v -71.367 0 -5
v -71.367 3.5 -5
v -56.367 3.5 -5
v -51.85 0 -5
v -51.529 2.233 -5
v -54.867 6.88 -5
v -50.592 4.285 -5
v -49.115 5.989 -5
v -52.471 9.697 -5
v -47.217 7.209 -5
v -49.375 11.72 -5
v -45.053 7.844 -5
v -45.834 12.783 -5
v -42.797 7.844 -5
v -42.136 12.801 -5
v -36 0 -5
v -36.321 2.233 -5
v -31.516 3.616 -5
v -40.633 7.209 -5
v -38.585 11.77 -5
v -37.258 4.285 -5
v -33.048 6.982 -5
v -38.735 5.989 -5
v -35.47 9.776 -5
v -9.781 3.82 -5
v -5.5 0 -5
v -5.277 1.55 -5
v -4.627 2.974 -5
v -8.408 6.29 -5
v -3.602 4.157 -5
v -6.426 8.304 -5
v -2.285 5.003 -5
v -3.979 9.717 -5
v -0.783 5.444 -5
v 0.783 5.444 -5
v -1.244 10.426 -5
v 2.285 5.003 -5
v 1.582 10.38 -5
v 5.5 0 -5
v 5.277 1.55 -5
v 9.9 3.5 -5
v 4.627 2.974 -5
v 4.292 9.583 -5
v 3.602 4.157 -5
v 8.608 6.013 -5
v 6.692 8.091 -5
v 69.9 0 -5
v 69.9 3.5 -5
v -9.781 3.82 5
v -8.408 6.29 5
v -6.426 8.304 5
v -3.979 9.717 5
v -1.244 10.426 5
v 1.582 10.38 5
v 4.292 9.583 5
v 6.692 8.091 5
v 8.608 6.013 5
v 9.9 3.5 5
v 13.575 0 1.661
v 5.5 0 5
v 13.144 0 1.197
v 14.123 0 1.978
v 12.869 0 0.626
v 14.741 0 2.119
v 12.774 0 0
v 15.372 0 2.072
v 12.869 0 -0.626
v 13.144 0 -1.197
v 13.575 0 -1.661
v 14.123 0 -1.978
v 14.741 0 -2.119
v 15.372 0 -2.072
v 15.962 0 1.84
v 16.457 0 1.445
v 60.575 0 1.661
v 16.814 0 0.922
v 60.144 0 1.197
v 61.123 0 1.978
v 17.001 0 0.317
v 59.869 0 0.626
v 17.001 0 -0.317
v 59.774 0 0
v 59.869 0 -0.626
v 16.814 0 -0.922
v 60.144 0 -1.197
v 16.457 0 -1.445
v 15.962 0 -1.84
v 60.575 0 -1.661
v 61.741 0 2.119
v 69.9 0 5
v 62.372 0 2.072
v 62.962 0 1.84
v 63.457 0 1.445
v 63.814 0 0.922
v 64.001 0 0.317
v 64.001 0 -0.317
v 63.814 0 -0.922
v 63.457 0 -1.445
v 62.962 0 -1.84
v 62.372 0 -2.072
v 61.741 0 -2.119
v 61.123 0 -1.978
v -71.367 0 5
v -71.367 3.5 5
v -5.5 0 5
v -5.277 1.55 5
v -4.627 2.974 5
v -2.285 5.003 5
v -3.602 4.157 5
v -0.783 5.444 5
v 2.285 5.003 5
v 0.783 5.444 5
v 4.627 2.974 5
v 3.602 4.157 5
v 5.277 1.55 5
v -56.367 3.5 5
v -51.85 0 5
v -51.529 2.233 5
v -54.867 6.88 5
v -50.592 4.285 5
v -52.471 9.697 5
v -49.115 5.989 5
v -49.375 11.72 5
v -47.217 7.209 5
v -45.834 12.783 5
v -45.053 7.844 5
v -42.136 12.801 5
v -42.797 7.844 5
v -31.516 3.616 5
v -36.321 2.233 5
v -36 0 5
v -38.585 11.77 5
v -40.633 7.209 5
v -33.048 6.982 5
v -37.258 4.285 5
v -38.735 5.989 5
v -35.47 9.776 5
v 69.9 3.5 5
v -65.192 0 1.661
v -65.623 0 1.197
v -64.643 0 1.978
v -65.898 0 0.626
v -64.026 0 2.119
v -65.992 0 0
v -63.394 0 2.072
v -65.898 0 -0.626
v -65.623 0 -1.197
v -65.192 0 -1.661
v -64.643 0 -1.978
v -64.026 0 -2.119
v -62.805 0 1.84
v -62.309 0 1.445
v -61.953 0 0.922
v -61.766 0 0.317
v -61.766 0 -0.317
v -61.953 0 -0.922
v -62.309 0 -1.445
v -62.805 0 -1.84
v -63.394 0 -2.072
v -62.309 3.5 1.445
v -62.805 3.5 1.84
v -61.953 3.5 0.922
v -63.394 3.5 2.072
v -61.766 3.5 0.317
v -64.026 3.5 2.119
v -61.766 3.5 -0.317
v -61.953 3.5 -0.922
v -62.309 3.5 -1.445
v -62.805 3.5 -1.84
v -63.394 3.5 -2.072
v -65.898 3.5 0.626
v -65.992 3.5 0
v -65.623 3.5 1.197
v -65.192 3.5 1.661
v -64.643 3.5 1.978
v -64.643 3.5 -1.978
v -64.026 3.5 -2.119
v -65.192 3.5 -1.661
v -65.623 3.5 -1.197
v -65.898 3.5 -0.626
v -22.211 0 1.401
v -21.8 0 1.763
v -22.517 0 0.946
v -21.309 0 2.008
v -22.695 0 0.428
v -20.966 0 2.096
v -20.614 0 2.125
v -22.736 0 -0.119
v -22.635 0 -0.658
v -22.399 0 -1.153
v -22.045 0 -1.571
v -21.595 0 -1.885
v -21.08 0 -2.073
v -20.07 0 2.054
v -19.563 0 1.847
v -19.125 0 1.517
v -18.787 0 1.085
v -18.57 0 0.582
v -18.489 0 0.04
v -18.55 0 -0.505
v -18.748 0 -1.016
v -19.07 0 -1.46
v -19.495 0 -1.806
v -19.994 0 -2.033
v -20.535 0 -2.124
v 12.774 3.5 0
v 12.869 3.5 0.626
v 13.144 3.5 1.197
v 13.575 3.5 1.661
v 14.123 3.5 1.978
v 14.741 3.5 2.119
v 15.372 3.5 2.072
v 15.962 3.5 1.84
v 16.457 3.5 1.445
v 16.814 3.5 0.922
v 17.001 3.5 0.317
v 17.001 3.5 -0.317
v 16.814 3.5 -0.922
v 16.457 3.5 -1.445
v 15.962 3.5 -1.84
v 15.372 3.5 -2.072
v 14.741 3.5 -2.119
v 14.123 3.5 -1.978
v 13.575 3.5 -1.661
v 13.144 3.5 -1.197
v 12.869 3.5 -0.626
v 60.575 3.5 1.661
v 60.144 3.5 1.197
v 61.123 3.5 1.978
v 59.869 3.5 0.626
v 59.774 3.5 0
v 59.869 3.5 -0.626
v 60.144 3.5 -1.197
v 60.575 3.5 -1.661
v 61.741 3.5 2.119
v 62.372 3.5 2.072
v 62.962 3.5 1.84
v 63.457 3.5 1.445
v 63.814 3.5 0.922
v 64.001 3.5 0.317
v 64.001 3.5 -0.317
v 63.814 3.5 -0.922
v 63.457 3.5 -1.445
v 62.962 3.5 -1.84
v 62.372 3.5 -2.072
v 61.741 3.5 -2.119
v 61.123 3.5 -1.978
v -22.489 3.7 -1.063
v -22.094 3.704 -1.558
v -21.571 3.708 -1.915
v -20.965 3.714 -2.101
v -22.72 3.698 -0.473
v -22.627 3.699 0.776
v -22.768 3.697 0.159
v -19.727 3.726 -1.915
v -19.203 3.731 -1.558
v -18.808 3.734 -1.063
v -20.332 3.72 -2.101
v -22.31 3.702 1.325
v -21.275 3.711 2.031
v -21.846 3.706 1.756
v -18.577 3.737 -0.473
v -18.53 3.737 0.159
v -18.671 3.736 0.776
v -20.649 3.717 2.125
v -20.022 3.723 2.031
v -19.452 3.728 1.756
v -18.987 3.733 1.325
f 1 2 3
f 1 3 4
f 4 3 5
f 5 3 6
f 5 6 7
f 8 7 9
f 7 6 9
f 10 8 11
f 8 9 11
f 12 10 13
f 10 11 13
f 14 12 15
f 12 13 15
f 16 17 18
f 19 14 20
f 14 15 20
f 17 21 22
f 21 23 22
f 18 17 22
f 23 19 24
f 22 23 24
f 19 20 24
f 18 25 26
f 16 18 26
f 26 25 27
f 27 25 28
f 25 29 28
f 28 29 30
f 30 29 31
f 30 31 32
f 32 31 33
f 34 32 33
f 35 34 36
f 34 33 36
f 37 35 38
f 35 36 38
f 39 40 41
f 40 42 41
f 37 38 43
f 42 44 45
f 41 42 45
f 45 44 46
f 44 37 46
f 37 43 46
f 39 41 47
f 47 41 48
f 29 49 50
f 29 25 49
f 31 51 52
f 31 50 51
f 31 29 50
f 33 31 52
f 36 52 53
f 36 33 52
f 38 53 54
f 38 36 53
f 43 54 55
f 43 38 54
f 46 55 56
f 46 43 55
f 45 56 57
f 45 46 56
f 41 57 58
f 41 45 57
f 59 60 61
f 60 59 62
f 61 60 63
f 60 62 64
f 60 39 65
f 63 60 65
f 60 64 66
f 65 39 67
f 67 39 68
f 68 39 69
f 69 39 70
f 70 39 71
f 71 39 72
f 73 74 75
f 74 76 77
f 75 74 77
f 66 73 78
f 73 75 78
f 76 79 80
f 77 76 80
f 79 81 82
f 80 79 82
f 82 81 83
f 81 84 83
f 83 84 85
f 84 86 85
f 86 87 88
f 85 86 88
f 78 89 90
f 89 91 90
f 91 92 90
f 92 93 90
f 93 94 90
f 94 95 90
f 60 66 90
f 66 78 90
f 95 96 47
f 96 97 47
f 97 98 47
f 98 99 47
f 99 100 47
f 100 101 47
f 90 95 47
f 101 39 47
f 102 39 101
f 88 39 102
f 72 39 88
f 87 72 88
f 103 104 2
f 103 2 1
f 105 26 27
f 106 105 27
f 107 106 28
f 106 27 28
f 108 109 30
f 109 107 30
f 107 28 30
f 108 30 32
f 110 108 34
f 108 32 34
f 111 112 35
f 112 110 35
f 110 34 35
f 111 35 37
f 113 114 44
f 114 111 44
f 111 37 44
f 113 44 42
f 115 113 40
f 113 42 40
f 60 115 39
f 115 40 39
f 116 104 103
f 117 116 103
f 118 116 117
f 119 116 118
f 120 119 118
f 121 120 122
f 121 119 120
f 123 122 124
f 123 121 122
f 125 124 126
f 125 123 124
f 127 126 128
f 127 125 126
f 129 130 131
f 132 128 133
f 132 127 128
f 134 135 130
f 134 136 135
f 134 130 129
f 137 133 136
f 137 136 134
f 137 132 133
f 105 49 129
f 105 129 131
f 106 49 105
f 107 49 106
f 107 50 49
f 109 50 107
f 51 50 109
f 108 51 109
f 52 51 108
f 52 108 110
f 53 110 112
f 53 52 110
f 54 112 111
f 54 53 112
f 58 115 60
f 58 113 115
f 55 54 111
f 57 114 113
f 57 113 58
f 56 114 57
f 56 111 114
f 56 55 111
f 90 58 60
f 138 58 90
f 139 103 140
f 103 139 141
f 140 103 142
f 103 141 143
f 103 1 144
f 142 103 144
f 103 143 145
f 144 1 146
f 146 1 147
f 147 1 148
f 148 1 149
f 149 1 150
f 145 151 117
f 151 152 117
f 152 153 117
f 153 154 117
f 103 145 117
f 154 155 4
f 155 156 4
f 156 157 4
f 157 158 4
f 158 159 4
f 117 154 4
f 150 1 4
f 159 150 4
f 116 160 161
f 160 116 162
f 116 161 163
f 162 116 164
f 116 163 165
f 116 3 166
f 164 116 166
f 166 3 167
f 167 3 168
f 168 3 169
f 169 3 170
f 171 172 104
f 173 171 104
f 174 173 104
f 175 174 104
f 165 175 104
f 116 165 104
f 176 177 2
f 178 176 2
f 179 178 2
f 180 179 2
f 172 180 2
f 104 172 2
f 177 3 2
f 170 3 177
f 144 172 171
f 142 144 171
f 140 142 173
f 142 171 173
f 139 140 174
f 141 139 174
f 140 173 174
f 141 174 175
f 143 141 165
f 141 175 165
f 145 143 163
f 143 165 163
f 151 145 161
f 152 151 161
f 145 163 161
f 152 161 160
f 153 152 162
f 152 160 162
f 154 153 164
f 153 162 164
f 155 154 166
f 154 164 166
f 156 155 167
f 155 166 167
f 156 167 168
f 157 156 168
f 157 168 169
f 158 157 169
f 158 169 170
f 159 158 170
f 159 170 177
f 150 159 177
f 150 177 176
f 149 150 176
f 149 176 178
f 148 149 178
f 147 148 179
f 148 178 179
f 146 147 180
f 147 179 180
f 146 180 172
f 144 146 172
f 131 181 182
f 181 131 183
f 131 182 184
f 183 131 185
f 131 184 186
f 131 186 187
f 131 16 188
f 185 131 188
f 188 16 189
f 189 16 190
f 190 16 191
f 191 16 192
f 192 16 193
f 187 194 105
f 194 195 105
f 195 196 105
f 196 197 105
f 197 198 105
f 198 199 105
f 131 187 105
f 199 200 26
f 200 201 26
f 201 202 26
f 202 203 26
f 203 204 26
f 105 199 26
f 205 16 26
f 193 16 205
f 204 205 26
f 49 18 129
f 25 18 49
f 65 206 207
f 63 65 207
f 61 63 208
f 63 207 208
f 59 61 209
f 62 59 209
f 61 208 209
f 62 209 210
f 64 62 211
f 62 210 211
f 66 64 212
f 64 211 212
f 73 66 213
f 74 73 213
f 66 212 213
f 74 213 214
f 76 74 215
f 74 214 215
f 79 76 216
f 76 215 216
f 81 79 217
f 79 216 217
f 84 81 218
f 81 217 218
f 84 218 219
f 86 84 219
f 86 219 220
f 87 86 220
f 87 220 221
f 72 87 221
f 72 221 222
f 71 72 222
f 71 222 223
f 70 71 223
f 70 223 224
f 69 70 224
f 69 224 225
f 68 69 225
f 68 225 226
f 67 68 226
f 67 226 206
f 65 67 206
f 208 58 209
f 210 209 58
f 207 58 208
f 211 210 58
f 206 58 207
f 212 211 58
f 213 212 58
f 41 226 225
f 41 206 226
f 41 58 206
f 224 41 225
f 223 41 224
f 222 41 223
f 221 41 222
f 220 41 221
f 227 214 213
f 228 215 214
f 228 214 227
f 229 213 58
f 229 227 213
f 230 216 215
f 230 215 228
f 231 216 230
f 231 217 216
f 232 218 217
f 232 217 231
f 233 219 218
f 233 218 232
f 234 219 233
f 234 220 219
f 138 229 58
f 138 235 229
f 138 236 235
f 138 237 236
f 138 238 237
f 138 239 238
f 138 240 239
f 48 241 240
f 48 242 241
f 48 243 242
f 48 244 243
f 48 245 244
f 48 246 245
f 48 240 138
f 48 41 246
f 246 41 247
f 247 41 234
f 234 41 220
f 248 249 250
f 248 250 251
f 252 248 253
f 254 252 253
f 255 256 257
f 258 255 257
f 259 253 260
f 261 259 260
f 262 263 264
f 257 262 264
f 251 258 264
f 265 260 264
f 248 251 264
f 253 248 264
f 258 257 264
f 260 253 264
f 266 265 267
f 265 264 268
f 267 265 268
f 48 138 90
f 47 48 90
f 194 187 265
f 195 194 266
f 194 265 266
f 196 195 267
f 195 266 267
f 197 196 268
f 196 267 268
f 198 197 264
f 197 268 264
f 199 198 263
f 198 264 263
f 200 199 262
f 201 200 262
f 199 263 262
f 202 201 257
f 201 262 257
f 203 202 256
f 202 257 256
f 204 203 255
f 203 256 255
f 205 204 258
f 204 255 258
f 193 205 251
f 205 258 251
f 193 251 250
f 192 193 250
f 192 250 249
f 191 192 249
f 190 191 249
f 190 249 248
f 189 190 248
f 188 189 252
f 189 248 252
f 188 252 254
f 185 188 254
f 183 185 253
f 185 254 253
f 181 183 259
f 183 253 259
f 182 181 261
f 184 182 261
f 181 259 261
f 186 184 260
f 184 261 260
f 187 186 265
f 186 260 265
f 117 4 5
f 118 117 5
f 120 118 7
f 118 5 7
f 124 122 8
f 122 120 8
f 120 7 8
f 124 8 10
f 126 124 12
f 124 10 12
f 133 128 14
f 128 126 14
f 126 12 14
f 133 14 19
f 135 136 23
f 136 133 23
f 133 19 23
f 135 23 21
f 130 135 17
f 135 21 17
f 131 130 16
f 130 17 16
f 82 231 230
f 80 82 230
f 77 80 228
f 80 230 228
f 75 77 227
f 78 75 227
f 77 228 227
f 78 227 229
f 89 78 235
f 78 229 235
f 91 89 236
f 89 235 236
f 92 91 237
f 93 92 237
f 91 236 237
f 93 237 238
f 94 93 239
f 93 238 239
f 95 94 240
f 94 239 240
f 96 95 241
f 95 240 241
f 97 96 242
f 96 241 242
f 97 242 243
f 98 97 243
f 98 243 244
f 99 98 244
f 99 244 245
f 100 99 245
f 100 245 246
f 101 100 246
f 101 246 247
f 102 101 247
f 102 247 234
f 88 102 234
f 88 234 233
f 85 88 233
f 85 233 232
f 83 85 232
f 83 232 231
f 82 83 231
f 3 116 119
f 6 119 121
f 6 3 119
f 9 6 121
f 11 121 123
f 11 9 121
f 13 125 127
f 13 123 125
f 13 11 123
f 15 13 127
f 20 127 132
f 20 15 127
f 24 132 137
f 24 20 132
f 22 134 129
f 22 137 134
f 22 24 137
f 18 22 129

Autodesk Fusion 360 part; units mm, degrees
sketch "Sketch1" plane through (0, 0, 0) normal (0, 0, 1) x (1, 0, 0)
  circle A0 centre (-43.925, 0) radius 12.925
  circle A1 centre (-43.925, 0) radius 7.925
  circle A2 centre (0, 0) radius 10.5
  circle A3 centre (0, 0) radius 5.5
  line L0 (9.8995, 3.5) -> (69.8995, 3.5)
  line L1 (69.8995, 3.5) -> (69.8995, -3.5)
  line L2 (69.8995, -3.5) -> (9.8995, -3.5)
  line L3 (-31.5162, 3.6163) -> (-9.7806, 3.8197)
  line L4 (-31.4507, -3.3834) -> (-10.006, -3.1827)
  line L5 (-56.3671, 3.5) -> (-71.3671, 3.5)
  line L6 (-71.3671, 3.5) -> (-71.3671, -3.5)
  line L7 (-71.3671, -3.5) -> (-56.3671, -3.5)
  line L8 (-43.925, 0) -> (0, 0) construction
  dimension "d1" = 3.5
  dimension "d2" = 3.5
  dimension "d3" = 3.5
  dimension "d4" = 3.5
  dimension "d5" = 3.5
  dimension "d6" = 3.5
  dimension "d7" = 43.925
  dimension "d8" = 60
  dimension "d9" = 15
  dimension "d19" = 25.85
  dimension "d20" = 21
  dimension "d21" = 11
  dimension "d22" = 15.85
extrude "Extrude1" add sketch "Sketch1" along normal mid plane 10
sketch "Sketch4" plane through (0, 3.5, 0) normal (0, 1, 0) x (-1, 0, 0)
  line L0 (71.3671, -5) -> (71.3671, 5)
  line L1 (71.3671, 5) -> (56.3671, 5)
  line L2 (56.3671, 5) -> (56.3671, -5)
  line L3 (56.3671, -5) -> (71.3671, -5)
  circle A0 centre (63.8671, 0) radius 2.125
  line L4 (31.5162, -5) -> (9.7806, -5)
  line L5 (31.5162, 5) -> (31.5162, -5)
  line L6 (9.7806, -5) -> (9.7806, 5)
  dimension "d25" = 4.25
  dimension "d27" = 5
  dimension "d31" = 7.5
  dimension "d32" = 7.5
extrude "Extrude4" cut sketch "Sketch4" along normal up to surface contours A0 end surface through (-31.4507, -3.3834, 0) normal (0.009359, -0.999956, 0) offset 0
sketch "Sketch5" plane through (-0.0366, 3.9109, 0) normal (-0.0094, 1, 0) x (0, 0, 1)
  line L0 (-5, -31.481) -> (5, -31.481)
  line L1 (5, -31.481) -> (5, -9.7444)
  line L2 (5, -9.7444) -> (-5, -9.7444)
  line L3 (-5, -9.7444) -> (-5, -31.481)
  circle A0 centre (0, -20.613) radius 2.125
  dimension "d35" = 4.25
  dimension "d36" = 10.868
  dimension "d37" = 10.8686
  dimension "d38" = 5
extrude "Extrude5" cut sketch "Sketch5" against normal up to surface (7 mm away) contours A0
sketch "Sketch6" plane through (0, 3.5, 0) normal (0, 1, 0) x (-1, 0, 0)
  line L0 (-9.8995, -5) -> (-9.8995, 5)
  line L1 (-9.8995, 5) -> (-69.8995, 5)
  line L2 (-69.8995, 5) -> (-69.8995, -5)
  line L3 (-69.8995, -5) -> (-9.8995, -5)
sketch "Sketch7" plane through (0, 3.5, 0) normal (0, 1, 0) x (-1, 0, 0)
  line L0 (-9.8995, -5) -> (-9.8995, 5) construction
  line L1 (-9.8995, 5) -> (-69.8995, 5) construction
  line L2 (-69.8995, 5) -> (-69.8995, -5) construction
  line L3 (-69.8995, -5) -> (-9.8995, -5) construction
  line L4 (-69.8995, 0) -> (-9.8995, 0) construction
  circle A0 centre (-61.8995, 0) radius 2.125
  circle A1 centre (-14.8995, 0) radius 2.125
  dimension "d41" = 4.25
  dimension "d42" = 4.25
  dimension "d43" = 8
  dimension "d44" = 5
extrude "Extrude6" cut sketch "Sketch7" against normal up to surface (7 mm away)
sketch "Sketch3" plane through (0, 0, 0) normal (0, 1, 0) x (1, 0, 0)
  line L0 (-71.3671, 5) -> (-71.3671, -5)
  line L1 (-71.3671, -5) -> (-56.3671, -5)
  line L2 (-56.3671, -5) -> (-56.3671, 5)
  line L3 (-56.3671, 5) -> (-71.3671, 5)
  line L4 (9.8995, 5) -> (9.8995, -5)
  line L5 (9.8995, -5) -> (69.8995, -5)
  line L6 (69.8995, -5) -> (69.8995, 5)
  line L7 (69.8995, 5) -> (9.8995, 5)
  line L8 (-71.3671, 5) -> (69.8995, 5)
  line L9 (69.8995, 5) -> (69.8995, -5)
  line L10 (69.8995, -5) -> (-71.3671, -5)
  line L11 (-71.3671, -5) -> (-71.3671, 5)
  circle A0 centre (-63.8671, 0) radius 2.125
  circle A1 centre (14.8995, 0) radius 2.125
  circle A2 centre (61.8995, 0) radius 2.125
extrude "Extrude3" cut sketch "Sketch3" against normal blind 20 contours L0 L1 L2 L3 L8 L10 L11 | L2 L4 L8 L10 | L4 L5 L6 L7 L8 L9 L10 | A0 | A1 | A2
equation "d2 = d1"
equation "d3 = d1"
equation "d4 = d1"
equation "d5 = d1"
equation "d6 = d1"
equation "d42 = d41"
